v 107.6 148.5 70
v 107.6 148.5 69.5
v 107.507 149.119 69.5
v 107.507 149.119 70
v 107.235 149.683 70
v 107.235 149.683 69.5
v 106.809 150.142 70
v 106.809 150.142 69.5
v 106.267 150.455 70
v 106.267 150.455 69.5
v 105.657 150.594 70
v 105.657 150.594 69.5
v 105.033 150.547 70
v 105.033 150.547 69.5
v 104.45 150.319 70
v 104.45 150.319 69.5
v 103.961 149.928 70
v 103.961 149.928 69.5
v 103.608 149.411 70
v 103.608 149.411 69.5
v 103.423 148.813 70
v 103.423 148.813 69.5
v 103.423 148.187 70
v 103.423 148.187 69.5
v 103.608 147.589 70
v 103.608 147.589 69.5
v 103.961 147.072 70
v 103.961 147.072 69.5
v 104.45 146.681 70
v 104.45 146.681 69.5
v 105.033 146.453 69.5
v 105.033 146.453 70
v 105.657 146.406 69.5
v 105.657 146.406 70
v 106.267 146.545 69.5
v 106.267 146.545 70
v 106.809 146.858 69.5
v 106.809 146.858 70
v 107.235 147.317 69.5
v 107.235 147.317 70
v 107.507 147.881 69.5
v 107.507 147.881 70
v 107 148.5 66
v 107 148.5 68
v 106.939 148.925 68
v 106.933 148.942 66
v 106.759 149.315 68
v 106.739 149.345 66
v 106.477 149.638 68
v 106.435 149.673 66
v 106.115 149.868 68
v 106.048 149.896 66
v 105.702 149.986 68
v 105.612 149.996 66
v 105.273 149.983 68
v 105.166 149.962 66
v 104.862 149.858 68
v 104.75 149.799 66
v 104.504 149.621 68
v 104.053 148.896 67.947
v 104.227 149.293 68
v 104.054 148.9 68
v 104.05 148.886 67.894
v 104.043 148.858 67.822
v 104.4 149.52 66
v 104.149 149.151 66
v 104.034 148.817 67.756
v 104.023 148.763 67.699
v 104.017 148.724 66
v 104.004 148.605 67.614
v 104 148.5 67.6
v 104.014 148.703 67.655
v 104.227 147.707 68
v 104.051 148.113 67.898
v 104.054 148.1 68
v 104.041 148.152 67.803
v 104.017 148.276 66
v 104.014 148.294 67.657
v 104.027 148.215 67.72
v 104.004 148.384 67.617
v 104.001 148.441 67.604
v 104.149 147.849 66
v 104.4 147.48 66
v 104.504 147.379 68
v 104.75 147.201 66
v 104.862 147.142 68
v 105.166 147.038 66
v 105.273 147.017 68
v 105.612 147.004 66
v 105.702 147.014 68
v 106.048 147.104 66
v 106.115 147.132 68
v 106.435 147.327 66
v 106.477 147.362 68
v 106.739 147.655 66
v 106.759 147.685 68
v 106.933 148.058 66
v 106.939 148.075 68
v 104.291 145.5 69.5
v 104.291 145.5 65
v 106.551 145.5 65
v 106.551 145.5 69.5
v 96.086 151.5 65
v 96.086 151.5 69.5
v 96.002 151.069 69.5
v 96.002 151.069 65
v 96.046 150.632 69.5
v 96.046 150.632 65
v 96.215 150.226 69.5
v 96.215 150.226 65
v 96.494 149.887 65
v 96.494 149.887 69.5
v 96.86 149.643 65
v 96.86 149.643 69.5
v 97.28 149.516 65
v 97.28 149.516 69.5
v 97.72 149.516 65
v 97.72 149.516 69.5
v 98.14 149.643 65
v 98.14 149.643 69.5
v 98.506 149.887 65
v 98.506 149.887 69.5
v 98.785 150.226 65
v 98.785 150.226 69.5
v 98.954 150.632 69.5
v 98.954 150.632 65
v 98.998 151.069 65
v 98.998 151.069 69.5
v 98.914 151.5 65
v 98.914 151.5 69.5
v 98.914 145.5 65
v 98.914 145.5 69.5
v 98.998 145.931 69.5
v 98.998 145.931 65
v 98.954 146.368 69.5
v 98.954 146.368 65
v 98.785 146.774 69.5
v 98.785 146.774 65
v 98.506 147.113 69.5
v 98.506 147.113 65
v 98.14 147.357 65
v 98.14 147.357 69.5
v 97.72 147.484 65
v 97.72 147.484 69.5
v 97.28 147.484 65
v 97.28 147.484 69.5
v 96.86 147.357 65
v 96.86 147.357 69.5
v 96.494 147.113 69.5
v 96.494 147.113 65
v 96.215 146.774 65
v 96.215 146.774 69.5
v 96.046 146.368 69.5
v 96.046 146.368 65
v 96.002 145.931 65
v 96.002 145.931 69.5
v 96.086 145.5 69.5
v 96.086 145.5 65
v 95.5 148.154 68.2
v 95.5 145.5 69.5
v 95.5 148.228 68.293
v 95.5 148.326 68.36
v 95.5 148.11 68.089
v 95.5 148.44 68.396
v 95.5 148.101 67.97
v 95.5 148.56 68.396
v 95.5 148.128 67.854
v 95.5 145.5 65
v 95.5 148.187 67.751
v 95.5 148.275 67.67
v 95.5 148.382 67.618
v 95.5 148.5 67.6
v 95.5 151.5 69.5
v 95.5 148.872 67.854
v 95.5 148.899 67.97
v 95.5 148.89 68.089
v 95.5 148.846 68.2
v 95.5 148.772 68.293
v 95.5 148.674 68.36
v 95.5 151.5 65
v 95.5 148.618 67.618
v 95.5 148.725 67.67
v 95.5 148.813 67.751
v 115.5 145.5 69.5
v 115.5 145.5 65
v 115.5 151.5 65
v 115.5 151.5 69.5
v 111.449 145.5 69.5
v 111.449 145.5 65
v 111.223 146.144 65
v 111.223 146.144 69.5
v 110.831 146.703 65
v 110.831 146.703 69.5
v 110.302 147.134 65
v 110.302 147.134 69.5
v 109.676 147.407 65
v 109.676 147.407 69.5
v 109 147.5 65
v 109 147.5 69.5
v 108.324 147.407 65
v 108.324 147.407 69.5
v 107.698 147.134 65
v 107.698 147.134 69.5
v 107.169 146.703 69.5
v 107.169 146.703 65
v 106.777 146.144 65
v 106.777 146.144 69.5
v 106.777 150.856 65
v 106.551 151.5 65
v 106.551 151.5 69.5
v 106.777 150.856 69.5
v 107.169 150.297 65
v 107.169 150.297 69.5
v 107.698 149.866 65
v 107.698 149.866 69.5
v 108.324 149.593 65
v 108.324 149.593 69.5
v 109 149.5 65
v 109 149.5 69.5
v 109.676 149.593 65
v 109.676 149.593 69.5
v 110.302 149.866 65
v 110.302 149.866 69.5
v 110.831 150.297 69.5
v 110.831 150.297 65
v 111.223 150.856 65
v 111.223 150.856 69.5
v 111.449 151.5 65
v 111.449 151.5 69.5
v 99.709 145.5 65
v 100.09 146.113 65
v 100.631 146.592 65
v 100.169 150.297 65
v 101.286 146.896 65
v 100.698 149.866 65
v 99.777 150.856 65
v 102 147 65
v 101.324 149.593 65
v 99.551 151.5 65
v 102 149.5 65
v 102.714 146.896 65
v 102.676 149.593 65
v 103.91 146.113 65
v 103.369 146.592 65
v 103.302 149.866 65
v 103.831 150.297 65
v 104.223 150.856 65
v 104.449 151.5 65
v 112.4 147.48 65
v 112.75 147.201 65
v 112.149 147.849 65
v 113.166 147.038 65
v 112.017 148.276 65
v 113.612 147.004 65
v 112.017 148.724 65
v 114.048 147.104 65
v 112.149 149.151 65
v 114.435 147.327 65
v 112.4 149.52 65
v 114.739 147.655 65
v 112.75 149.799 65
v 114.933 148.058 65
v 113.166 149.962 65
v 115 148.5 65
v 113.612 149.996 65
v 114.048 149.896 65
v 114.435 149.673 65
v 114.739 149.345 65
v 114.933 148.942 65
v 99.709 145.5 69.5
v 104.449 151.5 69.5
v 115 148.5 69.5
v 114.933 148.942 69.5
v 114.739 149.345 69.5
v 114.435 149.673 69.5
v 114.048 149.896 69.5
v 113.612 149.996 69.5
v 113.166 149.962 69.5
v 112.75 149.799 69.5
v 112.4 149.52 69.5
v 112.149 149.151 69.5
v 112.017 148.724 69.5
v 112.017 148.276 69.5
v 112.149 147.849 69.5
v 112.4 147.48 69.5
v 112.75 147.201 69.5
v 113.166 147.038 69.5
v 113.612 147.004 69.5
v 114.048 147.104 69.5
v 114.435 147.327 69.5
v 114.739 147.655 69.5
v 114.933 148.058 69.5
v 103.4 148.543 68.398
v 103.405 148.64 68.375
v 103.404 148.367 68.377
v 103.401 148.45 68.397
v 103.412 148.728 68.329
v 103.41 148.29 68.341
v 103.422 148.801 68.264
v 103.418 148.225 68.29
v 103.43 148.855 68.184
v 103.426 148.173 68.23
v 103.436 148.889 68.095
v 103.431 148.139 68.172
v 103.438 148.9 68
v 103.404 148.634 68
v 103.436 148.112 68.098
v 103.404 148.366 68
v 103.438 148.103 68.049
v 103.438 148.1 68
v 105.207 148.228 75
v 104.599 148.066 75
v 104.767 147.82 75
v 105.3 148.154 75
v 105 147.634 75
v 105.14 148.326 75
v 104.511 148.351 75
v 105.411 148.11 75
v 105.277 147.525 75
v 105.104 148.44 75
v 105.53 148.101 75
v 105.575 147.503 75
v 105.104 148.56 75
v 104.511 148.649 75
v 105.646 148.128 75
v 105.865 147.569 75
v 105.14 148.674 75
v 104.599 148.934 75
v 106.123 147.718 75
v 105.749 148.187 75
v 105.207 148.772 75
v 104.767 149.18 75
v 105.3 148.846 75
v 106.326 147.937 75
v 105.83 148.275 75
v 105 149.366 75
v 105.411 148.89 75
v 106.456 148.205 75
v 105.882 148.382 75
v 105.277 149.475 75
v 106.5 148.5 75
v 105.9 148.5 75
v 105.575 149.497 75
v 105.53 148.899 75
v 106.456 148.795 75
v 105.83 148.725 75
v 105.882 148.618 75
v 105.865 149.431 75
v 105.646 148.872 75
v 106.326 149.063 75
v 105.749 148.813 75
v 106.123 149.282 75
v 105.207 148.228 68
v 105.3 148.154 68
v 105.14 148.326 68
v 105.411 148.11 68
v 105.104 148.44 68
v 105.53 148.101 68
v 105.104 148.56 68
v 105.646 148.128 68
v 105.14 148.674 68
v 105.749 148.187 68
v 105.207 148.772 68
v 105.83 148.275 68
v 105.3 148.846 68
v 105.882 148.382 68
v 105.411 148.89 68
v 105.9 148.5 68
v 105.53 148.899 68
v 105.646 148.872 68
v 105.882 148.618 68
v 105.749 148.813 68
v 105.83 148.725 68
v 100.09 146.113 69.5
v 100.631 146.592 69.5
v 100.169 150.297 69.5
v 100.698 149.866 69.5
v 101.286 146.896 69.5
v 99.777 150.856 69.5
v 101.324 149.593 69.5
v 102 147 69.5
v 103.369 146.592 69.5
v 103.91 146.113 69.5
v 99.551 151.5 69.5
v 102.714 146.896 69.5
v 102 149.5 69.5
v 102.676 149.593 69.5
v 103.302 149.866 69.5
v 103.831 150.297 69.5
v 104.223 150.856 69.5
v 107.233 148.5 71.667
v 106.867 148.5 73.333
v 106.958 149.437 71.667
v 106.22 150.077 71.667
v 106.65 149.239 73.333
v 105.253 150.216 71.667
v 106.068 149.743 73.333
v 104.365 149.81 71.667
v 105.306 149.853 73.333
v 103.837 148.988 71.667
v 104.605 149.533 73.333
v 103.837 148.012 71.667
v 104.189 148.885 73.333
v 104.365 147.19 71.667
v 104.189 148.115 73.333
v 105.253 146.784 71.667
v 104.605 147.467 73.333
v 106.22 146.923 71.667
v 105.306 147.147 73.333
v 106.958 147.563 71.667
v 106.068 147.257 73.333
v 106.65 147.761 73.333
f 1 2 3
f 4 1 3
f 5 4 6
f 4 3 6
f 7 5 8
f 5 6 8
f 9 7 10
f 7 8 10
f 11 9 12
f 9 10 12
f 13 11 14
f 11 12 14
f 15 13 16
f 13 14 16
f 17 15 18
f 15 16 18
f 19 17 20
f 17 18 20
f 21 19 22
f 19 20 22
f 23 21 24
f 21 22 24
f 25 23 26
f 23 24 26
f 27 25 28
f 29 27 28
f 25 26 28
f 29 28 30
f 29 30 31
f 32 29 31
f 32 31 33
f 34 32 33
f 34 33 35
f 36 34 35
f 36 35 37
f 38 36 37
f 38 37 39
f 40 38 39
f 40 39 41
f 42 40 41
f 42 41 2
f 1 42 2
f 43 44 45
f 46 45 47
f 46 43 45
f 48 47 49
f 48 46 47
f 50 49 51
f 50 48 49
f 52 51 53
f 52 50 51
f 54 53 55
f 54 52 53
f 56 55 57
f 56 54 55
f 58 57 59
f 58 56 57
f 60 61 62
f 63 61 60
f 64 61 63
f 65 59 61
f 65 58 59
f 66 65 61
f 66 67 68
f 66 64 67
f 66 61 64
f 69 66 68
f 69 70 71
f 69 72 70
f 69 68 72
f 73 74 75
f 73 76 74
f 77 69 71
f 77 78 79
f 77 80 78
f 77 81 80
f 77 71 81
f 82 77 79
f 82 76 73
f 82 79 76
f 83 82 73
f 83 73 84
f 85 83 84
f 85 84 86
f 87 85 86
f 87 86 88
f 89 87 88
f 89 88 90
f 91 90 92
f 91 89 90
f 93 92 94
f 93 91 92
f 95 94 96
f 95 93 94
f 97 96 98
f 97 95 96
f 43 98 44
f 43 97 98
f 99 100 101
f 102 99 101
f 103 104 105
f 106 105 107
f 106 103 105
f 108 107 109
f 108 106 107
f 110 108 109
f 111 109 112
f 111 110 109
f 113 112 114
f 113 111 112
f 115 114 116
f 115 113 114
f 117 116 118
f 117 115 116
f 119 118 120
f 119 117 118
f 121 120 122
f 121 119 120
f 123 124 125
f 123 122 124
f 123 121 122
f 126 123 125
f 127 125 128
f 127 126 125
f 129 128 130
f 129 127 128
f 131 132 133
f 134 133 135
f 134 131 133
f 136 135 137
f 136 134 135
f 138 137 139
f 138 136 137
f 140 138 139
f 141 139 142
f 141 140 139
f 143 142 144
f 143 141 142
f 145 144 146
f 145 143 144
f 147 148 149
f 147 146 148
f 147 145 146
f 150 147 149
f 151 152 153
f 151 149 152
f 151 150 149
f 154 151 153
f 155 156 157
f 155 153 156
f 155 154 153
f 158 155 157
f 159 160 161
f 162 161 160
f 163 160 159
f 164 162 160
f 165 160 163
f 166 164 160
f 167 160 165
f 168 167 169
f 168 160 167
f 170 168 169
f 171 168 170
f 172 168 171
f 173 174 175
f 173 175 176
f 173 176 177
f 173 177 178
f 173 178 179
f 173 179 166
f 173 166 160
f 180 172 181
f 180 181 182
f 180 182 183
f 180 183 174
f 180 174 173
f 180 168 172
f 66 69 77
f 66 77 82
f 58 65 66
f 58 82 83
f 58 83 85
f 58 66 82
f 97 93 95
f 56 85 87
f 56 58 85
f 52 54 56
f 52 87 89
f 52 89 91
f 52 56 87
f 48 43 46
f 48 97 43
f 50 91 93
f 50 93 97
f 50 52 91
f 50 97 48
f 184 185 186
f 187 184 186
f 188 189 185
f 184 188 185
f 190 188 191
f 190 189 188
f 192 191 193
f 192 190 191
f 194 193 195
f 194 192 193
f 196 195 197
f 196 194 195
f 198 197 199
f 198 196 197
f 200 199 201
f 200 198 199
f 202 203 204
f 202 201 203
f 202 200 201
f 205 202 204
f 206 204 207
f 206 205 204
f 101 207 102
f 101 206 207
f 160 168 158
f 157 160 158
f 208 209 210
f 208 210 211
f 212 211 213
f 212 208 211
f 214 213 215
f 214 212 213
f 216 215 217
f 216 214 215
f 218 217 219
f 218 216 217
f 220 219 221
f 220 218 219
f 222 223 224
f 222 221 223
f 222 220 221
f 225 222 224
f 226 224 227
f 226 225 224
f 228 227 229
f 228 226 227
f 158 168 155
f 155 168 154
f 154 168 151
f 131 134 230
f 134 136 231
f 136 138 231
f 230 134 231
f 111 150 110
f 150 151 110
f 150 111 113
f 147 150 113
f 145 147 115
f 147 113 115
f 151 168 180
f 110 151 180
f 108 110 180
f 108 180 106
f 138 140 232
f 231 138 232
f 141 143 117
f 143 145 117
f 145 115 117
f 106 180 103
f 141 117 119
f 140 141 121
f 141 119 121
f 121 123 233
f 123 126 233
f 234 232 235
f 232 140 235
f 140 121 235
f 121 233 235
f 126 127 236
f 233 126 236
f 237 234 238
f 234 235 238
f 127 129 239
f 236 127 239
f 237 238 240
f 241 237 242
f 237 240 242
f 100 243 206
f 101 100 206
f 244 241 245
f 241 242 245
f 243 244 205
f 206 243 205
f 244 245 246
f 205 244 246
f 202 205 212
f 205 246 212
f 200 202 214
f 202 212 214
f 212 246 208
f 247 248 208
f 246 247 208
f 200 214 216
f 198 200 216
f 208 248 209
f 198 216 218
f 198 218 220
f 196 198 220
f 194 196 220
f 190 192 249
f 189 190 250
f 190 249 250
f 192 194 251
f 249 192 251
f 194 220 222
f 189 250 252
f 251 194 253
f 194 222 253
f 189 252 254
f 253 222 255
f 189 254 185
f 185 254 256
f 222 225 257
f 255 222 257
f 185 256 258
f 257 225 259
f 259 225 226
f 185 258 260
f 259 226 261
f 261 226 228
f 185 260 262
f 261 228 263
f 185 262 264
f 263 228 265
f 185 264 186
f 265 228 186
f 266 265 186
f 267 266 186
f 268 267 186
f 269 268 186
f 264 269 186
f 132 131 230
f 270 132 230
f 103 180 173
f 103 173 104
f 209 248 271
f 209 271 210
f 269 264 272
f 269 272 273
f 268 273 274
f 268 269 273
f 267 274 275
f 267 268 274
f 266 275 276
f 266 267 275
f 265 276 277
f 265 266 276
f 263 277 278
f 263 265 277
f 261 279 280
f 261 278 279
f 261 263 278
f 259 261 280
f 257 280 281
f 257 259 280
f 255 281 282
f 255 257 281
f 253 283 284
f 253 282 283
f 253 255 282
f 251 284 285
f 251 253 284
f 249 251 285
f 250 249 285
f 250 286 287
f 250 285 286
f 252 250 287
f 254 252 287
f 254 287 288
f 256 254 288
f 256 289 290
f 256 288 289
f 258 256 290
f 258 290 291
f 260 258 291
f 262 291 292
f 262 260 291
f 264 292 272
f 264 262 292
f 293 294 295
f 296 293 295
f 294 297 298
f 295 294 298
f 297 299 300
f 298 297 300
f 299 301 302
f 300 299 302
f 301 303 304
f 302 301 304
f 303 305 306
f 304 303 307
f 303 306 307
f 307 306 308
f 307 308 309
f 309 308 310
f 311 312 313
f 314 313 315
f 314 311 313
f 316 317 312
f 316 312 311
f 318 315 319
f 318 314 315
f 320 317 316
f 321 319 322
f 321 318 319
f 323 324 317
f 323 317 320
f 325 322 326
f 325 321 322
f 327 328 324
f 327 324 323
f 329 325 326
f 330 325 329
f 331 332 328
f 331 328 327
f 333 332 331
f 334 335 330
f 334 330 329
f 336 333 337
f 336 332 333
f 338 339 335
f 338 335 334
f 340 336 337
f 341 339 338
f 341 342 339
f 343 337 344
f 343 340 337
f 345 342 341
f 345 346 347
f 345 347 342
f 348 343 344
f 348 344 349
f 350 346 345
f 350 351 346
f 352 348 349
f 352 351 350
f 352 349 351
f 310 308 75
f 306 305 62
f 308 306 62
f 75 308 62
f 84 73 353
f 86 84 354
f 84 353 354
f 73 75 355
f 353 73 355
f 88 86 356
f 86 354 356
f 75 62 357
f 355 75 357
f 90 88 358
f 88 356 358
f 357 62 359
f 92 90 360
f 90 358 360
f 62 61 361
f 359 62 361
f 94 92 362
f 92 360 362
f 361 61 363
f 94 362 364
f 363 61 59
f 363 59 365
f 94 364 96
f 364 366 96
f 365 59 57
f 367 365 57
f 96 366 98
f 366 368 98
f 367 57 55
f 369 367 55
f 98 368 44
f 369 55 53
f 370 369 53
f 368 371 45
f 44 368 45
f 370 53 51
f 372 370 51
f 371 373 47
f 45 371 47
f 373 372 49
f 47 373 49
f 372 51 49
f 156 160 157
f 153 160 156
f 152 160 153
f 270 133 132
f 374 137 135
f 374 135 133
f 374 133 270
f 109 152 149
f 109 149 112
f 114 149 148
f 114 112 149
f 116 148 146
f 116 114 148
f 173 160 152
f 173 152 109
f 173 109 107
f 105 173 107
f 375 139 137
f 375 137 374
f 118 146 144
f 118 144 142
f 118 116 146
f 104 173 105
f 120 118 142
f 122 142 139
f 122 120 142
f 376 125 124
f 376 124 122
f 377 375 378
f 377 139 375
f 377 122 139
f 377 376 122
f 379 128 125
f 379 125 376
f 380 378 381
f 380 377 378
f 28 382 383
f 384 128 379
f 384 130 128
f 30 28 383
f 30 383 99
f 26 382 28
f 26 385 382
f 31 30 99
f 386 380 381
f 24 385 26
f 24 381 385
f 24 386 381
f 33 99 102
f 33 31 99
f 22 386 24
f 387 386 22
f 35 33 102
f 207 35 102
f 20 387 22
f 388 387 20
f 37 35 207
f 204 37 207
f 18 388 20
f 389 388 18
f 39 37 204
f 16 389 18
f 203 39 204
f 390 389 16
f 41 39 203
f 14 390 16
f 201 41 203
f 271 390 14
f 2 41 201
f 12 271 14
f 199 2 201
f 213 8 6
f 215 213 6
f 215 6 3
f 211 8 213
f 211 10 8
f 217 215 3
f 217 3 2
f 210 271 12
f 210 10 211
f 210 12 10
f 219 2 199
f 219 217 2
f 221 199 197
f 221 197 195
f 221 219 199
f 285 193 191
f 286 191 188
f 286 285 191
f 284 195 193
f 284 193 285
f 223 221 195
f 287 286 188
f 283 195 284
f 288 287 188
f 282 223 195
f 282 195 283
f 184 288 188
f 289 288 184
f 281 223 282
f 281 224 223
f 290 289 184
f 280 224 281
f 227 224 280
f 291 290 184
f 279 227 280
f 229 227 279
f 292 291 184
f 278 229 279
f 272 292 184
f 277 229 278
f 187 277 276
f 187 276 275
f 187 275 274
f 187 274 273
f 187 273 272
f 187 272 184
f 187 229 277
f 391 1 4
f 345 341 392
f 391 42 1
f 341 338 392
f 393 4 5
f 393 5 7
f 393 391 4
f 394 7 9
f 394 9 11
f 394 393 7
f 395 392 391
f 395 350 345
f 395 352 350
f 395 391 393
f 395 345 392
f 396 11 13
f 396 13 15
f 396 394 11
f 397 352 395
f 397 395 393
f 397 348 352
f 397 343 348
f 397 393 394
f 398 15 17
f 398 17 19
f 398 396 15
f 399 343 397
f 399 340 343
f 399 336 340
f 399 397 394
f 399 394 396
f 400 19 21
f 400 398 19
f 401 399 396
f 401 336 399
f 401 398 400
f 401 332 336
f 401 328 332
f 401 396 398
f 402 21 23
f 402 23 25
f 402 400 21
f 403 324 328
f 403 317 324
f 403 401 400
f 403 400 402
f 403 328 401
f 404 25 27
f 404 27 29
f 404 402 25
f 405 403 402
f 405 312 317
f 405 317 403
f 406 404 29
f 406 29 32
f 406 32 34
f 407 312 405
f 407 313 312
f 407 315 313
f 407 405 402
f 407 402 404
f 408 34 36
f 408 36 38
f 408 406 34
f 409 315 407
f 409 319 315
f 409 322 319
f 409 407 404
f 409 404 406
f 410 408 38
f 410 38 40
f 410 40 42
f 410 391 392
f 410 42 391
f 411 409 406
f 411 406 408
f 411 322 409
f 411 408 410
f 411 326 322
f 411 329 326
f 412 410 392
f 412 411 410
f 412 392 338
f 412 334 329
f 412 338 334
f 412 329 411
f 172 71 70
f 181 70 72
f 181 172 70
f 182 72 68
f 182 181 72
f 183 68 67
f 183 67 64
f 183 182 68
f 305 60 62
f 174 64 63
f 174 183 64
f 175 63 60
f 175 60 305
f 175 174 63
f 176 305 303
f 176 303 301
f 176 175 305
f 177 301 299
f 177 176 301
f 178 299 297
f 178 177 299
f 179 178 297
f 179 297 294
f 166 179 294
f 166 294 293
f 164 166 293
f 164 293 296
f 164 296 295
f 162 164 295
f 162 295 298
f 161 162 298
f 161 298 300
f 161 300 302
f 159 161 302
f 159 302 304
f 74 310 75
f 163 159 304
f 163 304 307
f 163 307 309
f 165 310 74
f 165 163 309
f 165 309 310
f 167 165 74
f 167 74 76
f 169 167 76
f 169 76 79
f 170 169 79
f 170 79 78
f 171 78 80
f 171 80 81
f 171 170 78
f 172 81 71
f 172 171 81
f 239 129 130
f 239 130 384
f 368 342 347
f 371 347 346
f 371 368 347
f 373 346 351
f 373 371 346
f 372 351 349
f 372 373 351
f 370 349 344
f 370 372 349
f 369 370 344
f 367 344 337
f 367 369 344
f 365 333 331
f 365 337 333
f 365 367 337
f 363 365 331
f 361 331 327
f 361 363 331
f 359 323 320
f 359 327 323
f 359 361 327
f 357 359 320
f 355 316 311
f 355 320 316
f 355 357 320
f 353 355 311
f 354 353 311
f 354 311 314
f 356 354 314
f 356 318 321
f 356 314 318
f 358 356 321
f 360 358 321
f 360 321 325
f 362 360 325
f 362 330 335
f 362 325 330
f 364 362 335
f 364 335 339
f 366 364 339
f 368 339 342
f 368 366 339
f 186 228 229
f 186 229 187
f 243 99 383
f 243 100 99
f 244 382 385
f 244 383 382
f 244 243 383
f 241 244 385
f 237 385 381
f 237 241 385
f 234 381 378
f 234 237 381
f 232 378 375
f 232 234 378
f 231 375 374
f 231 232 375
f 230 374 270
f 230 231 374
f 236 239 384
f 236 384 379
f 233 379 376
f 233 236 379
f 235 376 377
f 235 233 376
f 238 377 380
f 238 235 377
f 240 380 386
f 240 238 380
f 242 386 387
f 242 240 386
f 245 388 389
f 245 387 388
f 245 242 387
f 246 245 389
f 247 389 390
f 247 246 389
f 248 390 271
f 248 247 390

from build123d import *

# Parameters (mm, degrees)
CYLINDER119_R           = 1.5
CYLINDER119_DEPTH       = 8
CYLINDER121_R           = 2.5
CYLINDER121_DEPTH       = 8
CYLINDER122_R           = 2.5
CYLINDER122_DEPTH       = 8
CYLINDER123_R           = 2.5
CYLINDER123_DEPTH       = 8
CYLINDER124_R           = 2.5
CYLINDER124_DEPTH       = 8
CYLINDER126_R           = 2.1
CYLINDER126_DEPTH       = 5
CYLINDER118_R           = 1.5
CYLINDER118_DEPTH       = 8
CYLINDER128_R           = 0.4
CYLINDER128_DEPTH       = 9
CYLINDER128_PITCH_ANGLE = 90
BOX023_W                = 3
BOX023_H                = 6
BOX023_DEPTH            = 4.5
CYLINDER127_R           = 1.5
CYLINDER127_DEPTH       = 8
CYLINDER120_R           = 1.5
CYLINDER120_DEPTH       = 8
BOX021_W                = 20
BOX021_H                = 6
BOX021_DEPTH            = 4.5
CYLINDER129_R           = 0.4
CYLINDER129_DEPTH       = 10
CYLINDER130_R           = 2.1
CYLINDER130_DEPTH       = 2


with BuildPart() as bowtiemount1:
    # Cylinder119 → Cylinder119 (new body)
    with BuildSketch(Plane(origin=(114, 151, 63), x_dir=(1, 0, 0), z_dir=(0, 0, 1))):
        Circle(CYLINDER119_R)
    extrude(amount=CYLINDER119_DEPTH)


with BuildPart() as bowtiecut1:
    # Cylinder121 → Cylinder121 (new body)
    with BuildSketch(Plane(origin=(125.5, 145, 64), x_dir=(1, 0, 0), z_dir=(0, 0, 1))):
        Circle(CYLINDER121_R)
    extrude(amount=CYLINDER121_DEPTH)


with BuildPart() as bowtiecut2:
    # Cylinder122 → Cylinder122 (new body)
    with BuildSketch(Plane(origin=(125.5, 152, 64), x_dir=(1, 0, 0), z_dir=(0, 0, 1))):
        Circle(CYLINDER122_R)
    extrude(amount=CYLINDER122_DEPTH)


with BuildPart() as bowtiecut3:
    # Cylinder123 → Cylinder123 (new body)
    with BuildSketch(Plane(origin=(118.5, 152, 64), x_dir=(1, 0, 0), z_dir=(0, 0, 1))):
        Circle(CYLINDER123_R)
    extrude(amount=CYLINDER123_DEPTH)


with BuildPart() as bowtiecut4:
    # Cylinder124 → Cylinder124 (new body)
    with BuildSketch(Plane(origin=(118.5, 144.5, 64), x_dir=(1, 0, 0), z_dir=(0, 0, 1))):
        Circle(CYLINDER124_R)
    extrude(amount=CYLINDER124_DEPTH)


with BuildPart() as bowtienozzlecut:
    # Cylinder126 → Cylinder126 (new body)
    with BuildSketch(Plane(origin=(122, 148.5, 68.5), x_dir=(1, 0, 0), z_dir=(0, 0, 1))):
        Circle(CYLINDER126_R)
    extrude(amount=CYLINDER126_DEPTH)


with BuildPart() as bowtiecruciblehole:
    # Cylinder118 → Cylinder118 (new body)
    with BuildSketch(Plane(origin=(122, 148.5, 66), x_dir=(1, 0, 0), z_dir=(0, 0, 1))):
        Circle(CYLINDER118_R)
    extrude(amount=CYLINDER118_DEPTH)


with BuildPart() as bowtieinjector:
    # Cylinder128 → Cylinder128 (new body)
    with BuildSketch(Plane.XY):
        Circle(CYLINDER128_R)
    extrude(amount=CYLINDER128_DEPTH)


with BuildPart() as bowtieinjector_1:
    # Cylinder128 pitch: moved
    add(bowtieinjector.part.rotate(Axis((0, 0, 0), (0, 1, 0)), CYLINDER128_PITCH_ANGLE))


with BuildPart() as bowtieinjector_2:
    # Cylinder128 placement: moved
    add(bowtieinjector_1.part.moved(Location((112, 148.5, 68))))


with BuildPart() as bowtiecut5:
    # Box023 → Box023 (new body)
    with BuildSketch(Plane(origin=(125, 145.5, 73), x_dir=(1, 0, 0), z_dir=(0, 0, 1))):
        with Locations((1.5, 3)):
            Rectangle(BOX023_W, BOX023_H)
    extrude(amount=BOX023_DEPTH)


with BuildPart() as bowtiemount007:
    # Cylinder127 → Cylinder127 (new body)
    with BuildSketch(Plane(origin=(114, 146, 63), x_dir=(1, 0, 0), z_dir=(0, 0, 1))):
        Circle(CYLINDER127_R)
    extrude(amount=CYLINDER127_DEPTH)


with BuildPart() as fusion050:
    # Cylinder120 → Cylinder120 (new body)
    with BuildSketch(Plane(origin=(130, 148.5, 63), x_dir=(1, 0, 0), z_dir=(0, 0, 1))):
        Circle(CYLINDER120_R)
    extrude(amount=CYLINDER120_DEPTH)

    # Fusion050: union BowTieMount1, BowTieCut1, BowTieCut2, BowTieCut3, BowTieCut4, BowTieNozzleCut, BowTieCrucibleHole, BowTieInjector, BowTieCut5, BowTieMount007
    add(bowtiemount1.part)
    add(bowtiecut1.part)
    add(bowtiecut2.part)
    add(bowtiecut3.part)
    add(bowtiecut4.part)
    add(bowtienozzlecut.part)
    add(bowtiecruciblehole.part)
    add(bowtieinjector_2.part)
    add(bowtiecut5.part)
    add(bowtiemount007.part)


with BuildPart() as bowtie:
    # Box021 → Box021 (new body)
    with BuildSketch(Plane(origin=(112, 145.5, 65), x_dir=(1, 0, 0), z_dir=(0, 0, 1))):
        with Locations((10, 3)):
            Rectangle(BOX021_W, BOX021_H)
    extrude(amount=BOX021_DEPTH)

    # Cut015: cut Fusion050
    add(fusion050.part, mode=Mode.SUBTRACT)


with BuildPart() as bowtie_1:
    # Cut015 placement: moved
    add(bowtie.part.moved(Location((-16.5, 0, 0))))


with BuildPart() as bowtienozzle001:
    # Cylinder129 → Cylinder129 (new body)
    with BuildSketch(Plane(origin=(122, 148.5, 68), x_dir=(1, 0, 0), z_dir=(0, 0, 1))):
        Circle(CYLINDER129_R)
    extrude(amount=CYLINDER129_DEPTH)


with BuildPart() as cone:
    # Cone → Cone (revolve)
    with BuildSketch(Plane(origin=(122, 148.5, 70), x_dir=(1, 0, 0), z_dir=(0, -1, 0))):
        Polygon((0, 0), (2.1, 0), (1, 5), (0, 5), align=None)
    revolve(axis=Axis((122, 148.5, 70), (0, 0, 1)))


with BuildPart() as fusion055:
    # Cylinder130 → Cylinder130 (new body)
    with BuildSketch(Plane(origin=(122, 148.5, 68), x_dir=(1, 0, 0), z_dir=(0, 0, 1))):
        Circle(CYLINDER130_R)
    extrude(amount=CYLINDER130_DEPTH)

    # Fusion051: union Cone
    add(cone.part)

    # Cut016: cut BowTieNozzle001
    add(bowtienozzle001.part, mode=Mode.SUBTRACT)


with BuildPart() as fusion055_1:
    # Cut016 placement: moved
    add(fusion055.part.moved(Location((-16.5, 0, 0))))

    # Fusion055: union BowTie
    add(bowtie_1.part)


solid = fusion055_1.part
